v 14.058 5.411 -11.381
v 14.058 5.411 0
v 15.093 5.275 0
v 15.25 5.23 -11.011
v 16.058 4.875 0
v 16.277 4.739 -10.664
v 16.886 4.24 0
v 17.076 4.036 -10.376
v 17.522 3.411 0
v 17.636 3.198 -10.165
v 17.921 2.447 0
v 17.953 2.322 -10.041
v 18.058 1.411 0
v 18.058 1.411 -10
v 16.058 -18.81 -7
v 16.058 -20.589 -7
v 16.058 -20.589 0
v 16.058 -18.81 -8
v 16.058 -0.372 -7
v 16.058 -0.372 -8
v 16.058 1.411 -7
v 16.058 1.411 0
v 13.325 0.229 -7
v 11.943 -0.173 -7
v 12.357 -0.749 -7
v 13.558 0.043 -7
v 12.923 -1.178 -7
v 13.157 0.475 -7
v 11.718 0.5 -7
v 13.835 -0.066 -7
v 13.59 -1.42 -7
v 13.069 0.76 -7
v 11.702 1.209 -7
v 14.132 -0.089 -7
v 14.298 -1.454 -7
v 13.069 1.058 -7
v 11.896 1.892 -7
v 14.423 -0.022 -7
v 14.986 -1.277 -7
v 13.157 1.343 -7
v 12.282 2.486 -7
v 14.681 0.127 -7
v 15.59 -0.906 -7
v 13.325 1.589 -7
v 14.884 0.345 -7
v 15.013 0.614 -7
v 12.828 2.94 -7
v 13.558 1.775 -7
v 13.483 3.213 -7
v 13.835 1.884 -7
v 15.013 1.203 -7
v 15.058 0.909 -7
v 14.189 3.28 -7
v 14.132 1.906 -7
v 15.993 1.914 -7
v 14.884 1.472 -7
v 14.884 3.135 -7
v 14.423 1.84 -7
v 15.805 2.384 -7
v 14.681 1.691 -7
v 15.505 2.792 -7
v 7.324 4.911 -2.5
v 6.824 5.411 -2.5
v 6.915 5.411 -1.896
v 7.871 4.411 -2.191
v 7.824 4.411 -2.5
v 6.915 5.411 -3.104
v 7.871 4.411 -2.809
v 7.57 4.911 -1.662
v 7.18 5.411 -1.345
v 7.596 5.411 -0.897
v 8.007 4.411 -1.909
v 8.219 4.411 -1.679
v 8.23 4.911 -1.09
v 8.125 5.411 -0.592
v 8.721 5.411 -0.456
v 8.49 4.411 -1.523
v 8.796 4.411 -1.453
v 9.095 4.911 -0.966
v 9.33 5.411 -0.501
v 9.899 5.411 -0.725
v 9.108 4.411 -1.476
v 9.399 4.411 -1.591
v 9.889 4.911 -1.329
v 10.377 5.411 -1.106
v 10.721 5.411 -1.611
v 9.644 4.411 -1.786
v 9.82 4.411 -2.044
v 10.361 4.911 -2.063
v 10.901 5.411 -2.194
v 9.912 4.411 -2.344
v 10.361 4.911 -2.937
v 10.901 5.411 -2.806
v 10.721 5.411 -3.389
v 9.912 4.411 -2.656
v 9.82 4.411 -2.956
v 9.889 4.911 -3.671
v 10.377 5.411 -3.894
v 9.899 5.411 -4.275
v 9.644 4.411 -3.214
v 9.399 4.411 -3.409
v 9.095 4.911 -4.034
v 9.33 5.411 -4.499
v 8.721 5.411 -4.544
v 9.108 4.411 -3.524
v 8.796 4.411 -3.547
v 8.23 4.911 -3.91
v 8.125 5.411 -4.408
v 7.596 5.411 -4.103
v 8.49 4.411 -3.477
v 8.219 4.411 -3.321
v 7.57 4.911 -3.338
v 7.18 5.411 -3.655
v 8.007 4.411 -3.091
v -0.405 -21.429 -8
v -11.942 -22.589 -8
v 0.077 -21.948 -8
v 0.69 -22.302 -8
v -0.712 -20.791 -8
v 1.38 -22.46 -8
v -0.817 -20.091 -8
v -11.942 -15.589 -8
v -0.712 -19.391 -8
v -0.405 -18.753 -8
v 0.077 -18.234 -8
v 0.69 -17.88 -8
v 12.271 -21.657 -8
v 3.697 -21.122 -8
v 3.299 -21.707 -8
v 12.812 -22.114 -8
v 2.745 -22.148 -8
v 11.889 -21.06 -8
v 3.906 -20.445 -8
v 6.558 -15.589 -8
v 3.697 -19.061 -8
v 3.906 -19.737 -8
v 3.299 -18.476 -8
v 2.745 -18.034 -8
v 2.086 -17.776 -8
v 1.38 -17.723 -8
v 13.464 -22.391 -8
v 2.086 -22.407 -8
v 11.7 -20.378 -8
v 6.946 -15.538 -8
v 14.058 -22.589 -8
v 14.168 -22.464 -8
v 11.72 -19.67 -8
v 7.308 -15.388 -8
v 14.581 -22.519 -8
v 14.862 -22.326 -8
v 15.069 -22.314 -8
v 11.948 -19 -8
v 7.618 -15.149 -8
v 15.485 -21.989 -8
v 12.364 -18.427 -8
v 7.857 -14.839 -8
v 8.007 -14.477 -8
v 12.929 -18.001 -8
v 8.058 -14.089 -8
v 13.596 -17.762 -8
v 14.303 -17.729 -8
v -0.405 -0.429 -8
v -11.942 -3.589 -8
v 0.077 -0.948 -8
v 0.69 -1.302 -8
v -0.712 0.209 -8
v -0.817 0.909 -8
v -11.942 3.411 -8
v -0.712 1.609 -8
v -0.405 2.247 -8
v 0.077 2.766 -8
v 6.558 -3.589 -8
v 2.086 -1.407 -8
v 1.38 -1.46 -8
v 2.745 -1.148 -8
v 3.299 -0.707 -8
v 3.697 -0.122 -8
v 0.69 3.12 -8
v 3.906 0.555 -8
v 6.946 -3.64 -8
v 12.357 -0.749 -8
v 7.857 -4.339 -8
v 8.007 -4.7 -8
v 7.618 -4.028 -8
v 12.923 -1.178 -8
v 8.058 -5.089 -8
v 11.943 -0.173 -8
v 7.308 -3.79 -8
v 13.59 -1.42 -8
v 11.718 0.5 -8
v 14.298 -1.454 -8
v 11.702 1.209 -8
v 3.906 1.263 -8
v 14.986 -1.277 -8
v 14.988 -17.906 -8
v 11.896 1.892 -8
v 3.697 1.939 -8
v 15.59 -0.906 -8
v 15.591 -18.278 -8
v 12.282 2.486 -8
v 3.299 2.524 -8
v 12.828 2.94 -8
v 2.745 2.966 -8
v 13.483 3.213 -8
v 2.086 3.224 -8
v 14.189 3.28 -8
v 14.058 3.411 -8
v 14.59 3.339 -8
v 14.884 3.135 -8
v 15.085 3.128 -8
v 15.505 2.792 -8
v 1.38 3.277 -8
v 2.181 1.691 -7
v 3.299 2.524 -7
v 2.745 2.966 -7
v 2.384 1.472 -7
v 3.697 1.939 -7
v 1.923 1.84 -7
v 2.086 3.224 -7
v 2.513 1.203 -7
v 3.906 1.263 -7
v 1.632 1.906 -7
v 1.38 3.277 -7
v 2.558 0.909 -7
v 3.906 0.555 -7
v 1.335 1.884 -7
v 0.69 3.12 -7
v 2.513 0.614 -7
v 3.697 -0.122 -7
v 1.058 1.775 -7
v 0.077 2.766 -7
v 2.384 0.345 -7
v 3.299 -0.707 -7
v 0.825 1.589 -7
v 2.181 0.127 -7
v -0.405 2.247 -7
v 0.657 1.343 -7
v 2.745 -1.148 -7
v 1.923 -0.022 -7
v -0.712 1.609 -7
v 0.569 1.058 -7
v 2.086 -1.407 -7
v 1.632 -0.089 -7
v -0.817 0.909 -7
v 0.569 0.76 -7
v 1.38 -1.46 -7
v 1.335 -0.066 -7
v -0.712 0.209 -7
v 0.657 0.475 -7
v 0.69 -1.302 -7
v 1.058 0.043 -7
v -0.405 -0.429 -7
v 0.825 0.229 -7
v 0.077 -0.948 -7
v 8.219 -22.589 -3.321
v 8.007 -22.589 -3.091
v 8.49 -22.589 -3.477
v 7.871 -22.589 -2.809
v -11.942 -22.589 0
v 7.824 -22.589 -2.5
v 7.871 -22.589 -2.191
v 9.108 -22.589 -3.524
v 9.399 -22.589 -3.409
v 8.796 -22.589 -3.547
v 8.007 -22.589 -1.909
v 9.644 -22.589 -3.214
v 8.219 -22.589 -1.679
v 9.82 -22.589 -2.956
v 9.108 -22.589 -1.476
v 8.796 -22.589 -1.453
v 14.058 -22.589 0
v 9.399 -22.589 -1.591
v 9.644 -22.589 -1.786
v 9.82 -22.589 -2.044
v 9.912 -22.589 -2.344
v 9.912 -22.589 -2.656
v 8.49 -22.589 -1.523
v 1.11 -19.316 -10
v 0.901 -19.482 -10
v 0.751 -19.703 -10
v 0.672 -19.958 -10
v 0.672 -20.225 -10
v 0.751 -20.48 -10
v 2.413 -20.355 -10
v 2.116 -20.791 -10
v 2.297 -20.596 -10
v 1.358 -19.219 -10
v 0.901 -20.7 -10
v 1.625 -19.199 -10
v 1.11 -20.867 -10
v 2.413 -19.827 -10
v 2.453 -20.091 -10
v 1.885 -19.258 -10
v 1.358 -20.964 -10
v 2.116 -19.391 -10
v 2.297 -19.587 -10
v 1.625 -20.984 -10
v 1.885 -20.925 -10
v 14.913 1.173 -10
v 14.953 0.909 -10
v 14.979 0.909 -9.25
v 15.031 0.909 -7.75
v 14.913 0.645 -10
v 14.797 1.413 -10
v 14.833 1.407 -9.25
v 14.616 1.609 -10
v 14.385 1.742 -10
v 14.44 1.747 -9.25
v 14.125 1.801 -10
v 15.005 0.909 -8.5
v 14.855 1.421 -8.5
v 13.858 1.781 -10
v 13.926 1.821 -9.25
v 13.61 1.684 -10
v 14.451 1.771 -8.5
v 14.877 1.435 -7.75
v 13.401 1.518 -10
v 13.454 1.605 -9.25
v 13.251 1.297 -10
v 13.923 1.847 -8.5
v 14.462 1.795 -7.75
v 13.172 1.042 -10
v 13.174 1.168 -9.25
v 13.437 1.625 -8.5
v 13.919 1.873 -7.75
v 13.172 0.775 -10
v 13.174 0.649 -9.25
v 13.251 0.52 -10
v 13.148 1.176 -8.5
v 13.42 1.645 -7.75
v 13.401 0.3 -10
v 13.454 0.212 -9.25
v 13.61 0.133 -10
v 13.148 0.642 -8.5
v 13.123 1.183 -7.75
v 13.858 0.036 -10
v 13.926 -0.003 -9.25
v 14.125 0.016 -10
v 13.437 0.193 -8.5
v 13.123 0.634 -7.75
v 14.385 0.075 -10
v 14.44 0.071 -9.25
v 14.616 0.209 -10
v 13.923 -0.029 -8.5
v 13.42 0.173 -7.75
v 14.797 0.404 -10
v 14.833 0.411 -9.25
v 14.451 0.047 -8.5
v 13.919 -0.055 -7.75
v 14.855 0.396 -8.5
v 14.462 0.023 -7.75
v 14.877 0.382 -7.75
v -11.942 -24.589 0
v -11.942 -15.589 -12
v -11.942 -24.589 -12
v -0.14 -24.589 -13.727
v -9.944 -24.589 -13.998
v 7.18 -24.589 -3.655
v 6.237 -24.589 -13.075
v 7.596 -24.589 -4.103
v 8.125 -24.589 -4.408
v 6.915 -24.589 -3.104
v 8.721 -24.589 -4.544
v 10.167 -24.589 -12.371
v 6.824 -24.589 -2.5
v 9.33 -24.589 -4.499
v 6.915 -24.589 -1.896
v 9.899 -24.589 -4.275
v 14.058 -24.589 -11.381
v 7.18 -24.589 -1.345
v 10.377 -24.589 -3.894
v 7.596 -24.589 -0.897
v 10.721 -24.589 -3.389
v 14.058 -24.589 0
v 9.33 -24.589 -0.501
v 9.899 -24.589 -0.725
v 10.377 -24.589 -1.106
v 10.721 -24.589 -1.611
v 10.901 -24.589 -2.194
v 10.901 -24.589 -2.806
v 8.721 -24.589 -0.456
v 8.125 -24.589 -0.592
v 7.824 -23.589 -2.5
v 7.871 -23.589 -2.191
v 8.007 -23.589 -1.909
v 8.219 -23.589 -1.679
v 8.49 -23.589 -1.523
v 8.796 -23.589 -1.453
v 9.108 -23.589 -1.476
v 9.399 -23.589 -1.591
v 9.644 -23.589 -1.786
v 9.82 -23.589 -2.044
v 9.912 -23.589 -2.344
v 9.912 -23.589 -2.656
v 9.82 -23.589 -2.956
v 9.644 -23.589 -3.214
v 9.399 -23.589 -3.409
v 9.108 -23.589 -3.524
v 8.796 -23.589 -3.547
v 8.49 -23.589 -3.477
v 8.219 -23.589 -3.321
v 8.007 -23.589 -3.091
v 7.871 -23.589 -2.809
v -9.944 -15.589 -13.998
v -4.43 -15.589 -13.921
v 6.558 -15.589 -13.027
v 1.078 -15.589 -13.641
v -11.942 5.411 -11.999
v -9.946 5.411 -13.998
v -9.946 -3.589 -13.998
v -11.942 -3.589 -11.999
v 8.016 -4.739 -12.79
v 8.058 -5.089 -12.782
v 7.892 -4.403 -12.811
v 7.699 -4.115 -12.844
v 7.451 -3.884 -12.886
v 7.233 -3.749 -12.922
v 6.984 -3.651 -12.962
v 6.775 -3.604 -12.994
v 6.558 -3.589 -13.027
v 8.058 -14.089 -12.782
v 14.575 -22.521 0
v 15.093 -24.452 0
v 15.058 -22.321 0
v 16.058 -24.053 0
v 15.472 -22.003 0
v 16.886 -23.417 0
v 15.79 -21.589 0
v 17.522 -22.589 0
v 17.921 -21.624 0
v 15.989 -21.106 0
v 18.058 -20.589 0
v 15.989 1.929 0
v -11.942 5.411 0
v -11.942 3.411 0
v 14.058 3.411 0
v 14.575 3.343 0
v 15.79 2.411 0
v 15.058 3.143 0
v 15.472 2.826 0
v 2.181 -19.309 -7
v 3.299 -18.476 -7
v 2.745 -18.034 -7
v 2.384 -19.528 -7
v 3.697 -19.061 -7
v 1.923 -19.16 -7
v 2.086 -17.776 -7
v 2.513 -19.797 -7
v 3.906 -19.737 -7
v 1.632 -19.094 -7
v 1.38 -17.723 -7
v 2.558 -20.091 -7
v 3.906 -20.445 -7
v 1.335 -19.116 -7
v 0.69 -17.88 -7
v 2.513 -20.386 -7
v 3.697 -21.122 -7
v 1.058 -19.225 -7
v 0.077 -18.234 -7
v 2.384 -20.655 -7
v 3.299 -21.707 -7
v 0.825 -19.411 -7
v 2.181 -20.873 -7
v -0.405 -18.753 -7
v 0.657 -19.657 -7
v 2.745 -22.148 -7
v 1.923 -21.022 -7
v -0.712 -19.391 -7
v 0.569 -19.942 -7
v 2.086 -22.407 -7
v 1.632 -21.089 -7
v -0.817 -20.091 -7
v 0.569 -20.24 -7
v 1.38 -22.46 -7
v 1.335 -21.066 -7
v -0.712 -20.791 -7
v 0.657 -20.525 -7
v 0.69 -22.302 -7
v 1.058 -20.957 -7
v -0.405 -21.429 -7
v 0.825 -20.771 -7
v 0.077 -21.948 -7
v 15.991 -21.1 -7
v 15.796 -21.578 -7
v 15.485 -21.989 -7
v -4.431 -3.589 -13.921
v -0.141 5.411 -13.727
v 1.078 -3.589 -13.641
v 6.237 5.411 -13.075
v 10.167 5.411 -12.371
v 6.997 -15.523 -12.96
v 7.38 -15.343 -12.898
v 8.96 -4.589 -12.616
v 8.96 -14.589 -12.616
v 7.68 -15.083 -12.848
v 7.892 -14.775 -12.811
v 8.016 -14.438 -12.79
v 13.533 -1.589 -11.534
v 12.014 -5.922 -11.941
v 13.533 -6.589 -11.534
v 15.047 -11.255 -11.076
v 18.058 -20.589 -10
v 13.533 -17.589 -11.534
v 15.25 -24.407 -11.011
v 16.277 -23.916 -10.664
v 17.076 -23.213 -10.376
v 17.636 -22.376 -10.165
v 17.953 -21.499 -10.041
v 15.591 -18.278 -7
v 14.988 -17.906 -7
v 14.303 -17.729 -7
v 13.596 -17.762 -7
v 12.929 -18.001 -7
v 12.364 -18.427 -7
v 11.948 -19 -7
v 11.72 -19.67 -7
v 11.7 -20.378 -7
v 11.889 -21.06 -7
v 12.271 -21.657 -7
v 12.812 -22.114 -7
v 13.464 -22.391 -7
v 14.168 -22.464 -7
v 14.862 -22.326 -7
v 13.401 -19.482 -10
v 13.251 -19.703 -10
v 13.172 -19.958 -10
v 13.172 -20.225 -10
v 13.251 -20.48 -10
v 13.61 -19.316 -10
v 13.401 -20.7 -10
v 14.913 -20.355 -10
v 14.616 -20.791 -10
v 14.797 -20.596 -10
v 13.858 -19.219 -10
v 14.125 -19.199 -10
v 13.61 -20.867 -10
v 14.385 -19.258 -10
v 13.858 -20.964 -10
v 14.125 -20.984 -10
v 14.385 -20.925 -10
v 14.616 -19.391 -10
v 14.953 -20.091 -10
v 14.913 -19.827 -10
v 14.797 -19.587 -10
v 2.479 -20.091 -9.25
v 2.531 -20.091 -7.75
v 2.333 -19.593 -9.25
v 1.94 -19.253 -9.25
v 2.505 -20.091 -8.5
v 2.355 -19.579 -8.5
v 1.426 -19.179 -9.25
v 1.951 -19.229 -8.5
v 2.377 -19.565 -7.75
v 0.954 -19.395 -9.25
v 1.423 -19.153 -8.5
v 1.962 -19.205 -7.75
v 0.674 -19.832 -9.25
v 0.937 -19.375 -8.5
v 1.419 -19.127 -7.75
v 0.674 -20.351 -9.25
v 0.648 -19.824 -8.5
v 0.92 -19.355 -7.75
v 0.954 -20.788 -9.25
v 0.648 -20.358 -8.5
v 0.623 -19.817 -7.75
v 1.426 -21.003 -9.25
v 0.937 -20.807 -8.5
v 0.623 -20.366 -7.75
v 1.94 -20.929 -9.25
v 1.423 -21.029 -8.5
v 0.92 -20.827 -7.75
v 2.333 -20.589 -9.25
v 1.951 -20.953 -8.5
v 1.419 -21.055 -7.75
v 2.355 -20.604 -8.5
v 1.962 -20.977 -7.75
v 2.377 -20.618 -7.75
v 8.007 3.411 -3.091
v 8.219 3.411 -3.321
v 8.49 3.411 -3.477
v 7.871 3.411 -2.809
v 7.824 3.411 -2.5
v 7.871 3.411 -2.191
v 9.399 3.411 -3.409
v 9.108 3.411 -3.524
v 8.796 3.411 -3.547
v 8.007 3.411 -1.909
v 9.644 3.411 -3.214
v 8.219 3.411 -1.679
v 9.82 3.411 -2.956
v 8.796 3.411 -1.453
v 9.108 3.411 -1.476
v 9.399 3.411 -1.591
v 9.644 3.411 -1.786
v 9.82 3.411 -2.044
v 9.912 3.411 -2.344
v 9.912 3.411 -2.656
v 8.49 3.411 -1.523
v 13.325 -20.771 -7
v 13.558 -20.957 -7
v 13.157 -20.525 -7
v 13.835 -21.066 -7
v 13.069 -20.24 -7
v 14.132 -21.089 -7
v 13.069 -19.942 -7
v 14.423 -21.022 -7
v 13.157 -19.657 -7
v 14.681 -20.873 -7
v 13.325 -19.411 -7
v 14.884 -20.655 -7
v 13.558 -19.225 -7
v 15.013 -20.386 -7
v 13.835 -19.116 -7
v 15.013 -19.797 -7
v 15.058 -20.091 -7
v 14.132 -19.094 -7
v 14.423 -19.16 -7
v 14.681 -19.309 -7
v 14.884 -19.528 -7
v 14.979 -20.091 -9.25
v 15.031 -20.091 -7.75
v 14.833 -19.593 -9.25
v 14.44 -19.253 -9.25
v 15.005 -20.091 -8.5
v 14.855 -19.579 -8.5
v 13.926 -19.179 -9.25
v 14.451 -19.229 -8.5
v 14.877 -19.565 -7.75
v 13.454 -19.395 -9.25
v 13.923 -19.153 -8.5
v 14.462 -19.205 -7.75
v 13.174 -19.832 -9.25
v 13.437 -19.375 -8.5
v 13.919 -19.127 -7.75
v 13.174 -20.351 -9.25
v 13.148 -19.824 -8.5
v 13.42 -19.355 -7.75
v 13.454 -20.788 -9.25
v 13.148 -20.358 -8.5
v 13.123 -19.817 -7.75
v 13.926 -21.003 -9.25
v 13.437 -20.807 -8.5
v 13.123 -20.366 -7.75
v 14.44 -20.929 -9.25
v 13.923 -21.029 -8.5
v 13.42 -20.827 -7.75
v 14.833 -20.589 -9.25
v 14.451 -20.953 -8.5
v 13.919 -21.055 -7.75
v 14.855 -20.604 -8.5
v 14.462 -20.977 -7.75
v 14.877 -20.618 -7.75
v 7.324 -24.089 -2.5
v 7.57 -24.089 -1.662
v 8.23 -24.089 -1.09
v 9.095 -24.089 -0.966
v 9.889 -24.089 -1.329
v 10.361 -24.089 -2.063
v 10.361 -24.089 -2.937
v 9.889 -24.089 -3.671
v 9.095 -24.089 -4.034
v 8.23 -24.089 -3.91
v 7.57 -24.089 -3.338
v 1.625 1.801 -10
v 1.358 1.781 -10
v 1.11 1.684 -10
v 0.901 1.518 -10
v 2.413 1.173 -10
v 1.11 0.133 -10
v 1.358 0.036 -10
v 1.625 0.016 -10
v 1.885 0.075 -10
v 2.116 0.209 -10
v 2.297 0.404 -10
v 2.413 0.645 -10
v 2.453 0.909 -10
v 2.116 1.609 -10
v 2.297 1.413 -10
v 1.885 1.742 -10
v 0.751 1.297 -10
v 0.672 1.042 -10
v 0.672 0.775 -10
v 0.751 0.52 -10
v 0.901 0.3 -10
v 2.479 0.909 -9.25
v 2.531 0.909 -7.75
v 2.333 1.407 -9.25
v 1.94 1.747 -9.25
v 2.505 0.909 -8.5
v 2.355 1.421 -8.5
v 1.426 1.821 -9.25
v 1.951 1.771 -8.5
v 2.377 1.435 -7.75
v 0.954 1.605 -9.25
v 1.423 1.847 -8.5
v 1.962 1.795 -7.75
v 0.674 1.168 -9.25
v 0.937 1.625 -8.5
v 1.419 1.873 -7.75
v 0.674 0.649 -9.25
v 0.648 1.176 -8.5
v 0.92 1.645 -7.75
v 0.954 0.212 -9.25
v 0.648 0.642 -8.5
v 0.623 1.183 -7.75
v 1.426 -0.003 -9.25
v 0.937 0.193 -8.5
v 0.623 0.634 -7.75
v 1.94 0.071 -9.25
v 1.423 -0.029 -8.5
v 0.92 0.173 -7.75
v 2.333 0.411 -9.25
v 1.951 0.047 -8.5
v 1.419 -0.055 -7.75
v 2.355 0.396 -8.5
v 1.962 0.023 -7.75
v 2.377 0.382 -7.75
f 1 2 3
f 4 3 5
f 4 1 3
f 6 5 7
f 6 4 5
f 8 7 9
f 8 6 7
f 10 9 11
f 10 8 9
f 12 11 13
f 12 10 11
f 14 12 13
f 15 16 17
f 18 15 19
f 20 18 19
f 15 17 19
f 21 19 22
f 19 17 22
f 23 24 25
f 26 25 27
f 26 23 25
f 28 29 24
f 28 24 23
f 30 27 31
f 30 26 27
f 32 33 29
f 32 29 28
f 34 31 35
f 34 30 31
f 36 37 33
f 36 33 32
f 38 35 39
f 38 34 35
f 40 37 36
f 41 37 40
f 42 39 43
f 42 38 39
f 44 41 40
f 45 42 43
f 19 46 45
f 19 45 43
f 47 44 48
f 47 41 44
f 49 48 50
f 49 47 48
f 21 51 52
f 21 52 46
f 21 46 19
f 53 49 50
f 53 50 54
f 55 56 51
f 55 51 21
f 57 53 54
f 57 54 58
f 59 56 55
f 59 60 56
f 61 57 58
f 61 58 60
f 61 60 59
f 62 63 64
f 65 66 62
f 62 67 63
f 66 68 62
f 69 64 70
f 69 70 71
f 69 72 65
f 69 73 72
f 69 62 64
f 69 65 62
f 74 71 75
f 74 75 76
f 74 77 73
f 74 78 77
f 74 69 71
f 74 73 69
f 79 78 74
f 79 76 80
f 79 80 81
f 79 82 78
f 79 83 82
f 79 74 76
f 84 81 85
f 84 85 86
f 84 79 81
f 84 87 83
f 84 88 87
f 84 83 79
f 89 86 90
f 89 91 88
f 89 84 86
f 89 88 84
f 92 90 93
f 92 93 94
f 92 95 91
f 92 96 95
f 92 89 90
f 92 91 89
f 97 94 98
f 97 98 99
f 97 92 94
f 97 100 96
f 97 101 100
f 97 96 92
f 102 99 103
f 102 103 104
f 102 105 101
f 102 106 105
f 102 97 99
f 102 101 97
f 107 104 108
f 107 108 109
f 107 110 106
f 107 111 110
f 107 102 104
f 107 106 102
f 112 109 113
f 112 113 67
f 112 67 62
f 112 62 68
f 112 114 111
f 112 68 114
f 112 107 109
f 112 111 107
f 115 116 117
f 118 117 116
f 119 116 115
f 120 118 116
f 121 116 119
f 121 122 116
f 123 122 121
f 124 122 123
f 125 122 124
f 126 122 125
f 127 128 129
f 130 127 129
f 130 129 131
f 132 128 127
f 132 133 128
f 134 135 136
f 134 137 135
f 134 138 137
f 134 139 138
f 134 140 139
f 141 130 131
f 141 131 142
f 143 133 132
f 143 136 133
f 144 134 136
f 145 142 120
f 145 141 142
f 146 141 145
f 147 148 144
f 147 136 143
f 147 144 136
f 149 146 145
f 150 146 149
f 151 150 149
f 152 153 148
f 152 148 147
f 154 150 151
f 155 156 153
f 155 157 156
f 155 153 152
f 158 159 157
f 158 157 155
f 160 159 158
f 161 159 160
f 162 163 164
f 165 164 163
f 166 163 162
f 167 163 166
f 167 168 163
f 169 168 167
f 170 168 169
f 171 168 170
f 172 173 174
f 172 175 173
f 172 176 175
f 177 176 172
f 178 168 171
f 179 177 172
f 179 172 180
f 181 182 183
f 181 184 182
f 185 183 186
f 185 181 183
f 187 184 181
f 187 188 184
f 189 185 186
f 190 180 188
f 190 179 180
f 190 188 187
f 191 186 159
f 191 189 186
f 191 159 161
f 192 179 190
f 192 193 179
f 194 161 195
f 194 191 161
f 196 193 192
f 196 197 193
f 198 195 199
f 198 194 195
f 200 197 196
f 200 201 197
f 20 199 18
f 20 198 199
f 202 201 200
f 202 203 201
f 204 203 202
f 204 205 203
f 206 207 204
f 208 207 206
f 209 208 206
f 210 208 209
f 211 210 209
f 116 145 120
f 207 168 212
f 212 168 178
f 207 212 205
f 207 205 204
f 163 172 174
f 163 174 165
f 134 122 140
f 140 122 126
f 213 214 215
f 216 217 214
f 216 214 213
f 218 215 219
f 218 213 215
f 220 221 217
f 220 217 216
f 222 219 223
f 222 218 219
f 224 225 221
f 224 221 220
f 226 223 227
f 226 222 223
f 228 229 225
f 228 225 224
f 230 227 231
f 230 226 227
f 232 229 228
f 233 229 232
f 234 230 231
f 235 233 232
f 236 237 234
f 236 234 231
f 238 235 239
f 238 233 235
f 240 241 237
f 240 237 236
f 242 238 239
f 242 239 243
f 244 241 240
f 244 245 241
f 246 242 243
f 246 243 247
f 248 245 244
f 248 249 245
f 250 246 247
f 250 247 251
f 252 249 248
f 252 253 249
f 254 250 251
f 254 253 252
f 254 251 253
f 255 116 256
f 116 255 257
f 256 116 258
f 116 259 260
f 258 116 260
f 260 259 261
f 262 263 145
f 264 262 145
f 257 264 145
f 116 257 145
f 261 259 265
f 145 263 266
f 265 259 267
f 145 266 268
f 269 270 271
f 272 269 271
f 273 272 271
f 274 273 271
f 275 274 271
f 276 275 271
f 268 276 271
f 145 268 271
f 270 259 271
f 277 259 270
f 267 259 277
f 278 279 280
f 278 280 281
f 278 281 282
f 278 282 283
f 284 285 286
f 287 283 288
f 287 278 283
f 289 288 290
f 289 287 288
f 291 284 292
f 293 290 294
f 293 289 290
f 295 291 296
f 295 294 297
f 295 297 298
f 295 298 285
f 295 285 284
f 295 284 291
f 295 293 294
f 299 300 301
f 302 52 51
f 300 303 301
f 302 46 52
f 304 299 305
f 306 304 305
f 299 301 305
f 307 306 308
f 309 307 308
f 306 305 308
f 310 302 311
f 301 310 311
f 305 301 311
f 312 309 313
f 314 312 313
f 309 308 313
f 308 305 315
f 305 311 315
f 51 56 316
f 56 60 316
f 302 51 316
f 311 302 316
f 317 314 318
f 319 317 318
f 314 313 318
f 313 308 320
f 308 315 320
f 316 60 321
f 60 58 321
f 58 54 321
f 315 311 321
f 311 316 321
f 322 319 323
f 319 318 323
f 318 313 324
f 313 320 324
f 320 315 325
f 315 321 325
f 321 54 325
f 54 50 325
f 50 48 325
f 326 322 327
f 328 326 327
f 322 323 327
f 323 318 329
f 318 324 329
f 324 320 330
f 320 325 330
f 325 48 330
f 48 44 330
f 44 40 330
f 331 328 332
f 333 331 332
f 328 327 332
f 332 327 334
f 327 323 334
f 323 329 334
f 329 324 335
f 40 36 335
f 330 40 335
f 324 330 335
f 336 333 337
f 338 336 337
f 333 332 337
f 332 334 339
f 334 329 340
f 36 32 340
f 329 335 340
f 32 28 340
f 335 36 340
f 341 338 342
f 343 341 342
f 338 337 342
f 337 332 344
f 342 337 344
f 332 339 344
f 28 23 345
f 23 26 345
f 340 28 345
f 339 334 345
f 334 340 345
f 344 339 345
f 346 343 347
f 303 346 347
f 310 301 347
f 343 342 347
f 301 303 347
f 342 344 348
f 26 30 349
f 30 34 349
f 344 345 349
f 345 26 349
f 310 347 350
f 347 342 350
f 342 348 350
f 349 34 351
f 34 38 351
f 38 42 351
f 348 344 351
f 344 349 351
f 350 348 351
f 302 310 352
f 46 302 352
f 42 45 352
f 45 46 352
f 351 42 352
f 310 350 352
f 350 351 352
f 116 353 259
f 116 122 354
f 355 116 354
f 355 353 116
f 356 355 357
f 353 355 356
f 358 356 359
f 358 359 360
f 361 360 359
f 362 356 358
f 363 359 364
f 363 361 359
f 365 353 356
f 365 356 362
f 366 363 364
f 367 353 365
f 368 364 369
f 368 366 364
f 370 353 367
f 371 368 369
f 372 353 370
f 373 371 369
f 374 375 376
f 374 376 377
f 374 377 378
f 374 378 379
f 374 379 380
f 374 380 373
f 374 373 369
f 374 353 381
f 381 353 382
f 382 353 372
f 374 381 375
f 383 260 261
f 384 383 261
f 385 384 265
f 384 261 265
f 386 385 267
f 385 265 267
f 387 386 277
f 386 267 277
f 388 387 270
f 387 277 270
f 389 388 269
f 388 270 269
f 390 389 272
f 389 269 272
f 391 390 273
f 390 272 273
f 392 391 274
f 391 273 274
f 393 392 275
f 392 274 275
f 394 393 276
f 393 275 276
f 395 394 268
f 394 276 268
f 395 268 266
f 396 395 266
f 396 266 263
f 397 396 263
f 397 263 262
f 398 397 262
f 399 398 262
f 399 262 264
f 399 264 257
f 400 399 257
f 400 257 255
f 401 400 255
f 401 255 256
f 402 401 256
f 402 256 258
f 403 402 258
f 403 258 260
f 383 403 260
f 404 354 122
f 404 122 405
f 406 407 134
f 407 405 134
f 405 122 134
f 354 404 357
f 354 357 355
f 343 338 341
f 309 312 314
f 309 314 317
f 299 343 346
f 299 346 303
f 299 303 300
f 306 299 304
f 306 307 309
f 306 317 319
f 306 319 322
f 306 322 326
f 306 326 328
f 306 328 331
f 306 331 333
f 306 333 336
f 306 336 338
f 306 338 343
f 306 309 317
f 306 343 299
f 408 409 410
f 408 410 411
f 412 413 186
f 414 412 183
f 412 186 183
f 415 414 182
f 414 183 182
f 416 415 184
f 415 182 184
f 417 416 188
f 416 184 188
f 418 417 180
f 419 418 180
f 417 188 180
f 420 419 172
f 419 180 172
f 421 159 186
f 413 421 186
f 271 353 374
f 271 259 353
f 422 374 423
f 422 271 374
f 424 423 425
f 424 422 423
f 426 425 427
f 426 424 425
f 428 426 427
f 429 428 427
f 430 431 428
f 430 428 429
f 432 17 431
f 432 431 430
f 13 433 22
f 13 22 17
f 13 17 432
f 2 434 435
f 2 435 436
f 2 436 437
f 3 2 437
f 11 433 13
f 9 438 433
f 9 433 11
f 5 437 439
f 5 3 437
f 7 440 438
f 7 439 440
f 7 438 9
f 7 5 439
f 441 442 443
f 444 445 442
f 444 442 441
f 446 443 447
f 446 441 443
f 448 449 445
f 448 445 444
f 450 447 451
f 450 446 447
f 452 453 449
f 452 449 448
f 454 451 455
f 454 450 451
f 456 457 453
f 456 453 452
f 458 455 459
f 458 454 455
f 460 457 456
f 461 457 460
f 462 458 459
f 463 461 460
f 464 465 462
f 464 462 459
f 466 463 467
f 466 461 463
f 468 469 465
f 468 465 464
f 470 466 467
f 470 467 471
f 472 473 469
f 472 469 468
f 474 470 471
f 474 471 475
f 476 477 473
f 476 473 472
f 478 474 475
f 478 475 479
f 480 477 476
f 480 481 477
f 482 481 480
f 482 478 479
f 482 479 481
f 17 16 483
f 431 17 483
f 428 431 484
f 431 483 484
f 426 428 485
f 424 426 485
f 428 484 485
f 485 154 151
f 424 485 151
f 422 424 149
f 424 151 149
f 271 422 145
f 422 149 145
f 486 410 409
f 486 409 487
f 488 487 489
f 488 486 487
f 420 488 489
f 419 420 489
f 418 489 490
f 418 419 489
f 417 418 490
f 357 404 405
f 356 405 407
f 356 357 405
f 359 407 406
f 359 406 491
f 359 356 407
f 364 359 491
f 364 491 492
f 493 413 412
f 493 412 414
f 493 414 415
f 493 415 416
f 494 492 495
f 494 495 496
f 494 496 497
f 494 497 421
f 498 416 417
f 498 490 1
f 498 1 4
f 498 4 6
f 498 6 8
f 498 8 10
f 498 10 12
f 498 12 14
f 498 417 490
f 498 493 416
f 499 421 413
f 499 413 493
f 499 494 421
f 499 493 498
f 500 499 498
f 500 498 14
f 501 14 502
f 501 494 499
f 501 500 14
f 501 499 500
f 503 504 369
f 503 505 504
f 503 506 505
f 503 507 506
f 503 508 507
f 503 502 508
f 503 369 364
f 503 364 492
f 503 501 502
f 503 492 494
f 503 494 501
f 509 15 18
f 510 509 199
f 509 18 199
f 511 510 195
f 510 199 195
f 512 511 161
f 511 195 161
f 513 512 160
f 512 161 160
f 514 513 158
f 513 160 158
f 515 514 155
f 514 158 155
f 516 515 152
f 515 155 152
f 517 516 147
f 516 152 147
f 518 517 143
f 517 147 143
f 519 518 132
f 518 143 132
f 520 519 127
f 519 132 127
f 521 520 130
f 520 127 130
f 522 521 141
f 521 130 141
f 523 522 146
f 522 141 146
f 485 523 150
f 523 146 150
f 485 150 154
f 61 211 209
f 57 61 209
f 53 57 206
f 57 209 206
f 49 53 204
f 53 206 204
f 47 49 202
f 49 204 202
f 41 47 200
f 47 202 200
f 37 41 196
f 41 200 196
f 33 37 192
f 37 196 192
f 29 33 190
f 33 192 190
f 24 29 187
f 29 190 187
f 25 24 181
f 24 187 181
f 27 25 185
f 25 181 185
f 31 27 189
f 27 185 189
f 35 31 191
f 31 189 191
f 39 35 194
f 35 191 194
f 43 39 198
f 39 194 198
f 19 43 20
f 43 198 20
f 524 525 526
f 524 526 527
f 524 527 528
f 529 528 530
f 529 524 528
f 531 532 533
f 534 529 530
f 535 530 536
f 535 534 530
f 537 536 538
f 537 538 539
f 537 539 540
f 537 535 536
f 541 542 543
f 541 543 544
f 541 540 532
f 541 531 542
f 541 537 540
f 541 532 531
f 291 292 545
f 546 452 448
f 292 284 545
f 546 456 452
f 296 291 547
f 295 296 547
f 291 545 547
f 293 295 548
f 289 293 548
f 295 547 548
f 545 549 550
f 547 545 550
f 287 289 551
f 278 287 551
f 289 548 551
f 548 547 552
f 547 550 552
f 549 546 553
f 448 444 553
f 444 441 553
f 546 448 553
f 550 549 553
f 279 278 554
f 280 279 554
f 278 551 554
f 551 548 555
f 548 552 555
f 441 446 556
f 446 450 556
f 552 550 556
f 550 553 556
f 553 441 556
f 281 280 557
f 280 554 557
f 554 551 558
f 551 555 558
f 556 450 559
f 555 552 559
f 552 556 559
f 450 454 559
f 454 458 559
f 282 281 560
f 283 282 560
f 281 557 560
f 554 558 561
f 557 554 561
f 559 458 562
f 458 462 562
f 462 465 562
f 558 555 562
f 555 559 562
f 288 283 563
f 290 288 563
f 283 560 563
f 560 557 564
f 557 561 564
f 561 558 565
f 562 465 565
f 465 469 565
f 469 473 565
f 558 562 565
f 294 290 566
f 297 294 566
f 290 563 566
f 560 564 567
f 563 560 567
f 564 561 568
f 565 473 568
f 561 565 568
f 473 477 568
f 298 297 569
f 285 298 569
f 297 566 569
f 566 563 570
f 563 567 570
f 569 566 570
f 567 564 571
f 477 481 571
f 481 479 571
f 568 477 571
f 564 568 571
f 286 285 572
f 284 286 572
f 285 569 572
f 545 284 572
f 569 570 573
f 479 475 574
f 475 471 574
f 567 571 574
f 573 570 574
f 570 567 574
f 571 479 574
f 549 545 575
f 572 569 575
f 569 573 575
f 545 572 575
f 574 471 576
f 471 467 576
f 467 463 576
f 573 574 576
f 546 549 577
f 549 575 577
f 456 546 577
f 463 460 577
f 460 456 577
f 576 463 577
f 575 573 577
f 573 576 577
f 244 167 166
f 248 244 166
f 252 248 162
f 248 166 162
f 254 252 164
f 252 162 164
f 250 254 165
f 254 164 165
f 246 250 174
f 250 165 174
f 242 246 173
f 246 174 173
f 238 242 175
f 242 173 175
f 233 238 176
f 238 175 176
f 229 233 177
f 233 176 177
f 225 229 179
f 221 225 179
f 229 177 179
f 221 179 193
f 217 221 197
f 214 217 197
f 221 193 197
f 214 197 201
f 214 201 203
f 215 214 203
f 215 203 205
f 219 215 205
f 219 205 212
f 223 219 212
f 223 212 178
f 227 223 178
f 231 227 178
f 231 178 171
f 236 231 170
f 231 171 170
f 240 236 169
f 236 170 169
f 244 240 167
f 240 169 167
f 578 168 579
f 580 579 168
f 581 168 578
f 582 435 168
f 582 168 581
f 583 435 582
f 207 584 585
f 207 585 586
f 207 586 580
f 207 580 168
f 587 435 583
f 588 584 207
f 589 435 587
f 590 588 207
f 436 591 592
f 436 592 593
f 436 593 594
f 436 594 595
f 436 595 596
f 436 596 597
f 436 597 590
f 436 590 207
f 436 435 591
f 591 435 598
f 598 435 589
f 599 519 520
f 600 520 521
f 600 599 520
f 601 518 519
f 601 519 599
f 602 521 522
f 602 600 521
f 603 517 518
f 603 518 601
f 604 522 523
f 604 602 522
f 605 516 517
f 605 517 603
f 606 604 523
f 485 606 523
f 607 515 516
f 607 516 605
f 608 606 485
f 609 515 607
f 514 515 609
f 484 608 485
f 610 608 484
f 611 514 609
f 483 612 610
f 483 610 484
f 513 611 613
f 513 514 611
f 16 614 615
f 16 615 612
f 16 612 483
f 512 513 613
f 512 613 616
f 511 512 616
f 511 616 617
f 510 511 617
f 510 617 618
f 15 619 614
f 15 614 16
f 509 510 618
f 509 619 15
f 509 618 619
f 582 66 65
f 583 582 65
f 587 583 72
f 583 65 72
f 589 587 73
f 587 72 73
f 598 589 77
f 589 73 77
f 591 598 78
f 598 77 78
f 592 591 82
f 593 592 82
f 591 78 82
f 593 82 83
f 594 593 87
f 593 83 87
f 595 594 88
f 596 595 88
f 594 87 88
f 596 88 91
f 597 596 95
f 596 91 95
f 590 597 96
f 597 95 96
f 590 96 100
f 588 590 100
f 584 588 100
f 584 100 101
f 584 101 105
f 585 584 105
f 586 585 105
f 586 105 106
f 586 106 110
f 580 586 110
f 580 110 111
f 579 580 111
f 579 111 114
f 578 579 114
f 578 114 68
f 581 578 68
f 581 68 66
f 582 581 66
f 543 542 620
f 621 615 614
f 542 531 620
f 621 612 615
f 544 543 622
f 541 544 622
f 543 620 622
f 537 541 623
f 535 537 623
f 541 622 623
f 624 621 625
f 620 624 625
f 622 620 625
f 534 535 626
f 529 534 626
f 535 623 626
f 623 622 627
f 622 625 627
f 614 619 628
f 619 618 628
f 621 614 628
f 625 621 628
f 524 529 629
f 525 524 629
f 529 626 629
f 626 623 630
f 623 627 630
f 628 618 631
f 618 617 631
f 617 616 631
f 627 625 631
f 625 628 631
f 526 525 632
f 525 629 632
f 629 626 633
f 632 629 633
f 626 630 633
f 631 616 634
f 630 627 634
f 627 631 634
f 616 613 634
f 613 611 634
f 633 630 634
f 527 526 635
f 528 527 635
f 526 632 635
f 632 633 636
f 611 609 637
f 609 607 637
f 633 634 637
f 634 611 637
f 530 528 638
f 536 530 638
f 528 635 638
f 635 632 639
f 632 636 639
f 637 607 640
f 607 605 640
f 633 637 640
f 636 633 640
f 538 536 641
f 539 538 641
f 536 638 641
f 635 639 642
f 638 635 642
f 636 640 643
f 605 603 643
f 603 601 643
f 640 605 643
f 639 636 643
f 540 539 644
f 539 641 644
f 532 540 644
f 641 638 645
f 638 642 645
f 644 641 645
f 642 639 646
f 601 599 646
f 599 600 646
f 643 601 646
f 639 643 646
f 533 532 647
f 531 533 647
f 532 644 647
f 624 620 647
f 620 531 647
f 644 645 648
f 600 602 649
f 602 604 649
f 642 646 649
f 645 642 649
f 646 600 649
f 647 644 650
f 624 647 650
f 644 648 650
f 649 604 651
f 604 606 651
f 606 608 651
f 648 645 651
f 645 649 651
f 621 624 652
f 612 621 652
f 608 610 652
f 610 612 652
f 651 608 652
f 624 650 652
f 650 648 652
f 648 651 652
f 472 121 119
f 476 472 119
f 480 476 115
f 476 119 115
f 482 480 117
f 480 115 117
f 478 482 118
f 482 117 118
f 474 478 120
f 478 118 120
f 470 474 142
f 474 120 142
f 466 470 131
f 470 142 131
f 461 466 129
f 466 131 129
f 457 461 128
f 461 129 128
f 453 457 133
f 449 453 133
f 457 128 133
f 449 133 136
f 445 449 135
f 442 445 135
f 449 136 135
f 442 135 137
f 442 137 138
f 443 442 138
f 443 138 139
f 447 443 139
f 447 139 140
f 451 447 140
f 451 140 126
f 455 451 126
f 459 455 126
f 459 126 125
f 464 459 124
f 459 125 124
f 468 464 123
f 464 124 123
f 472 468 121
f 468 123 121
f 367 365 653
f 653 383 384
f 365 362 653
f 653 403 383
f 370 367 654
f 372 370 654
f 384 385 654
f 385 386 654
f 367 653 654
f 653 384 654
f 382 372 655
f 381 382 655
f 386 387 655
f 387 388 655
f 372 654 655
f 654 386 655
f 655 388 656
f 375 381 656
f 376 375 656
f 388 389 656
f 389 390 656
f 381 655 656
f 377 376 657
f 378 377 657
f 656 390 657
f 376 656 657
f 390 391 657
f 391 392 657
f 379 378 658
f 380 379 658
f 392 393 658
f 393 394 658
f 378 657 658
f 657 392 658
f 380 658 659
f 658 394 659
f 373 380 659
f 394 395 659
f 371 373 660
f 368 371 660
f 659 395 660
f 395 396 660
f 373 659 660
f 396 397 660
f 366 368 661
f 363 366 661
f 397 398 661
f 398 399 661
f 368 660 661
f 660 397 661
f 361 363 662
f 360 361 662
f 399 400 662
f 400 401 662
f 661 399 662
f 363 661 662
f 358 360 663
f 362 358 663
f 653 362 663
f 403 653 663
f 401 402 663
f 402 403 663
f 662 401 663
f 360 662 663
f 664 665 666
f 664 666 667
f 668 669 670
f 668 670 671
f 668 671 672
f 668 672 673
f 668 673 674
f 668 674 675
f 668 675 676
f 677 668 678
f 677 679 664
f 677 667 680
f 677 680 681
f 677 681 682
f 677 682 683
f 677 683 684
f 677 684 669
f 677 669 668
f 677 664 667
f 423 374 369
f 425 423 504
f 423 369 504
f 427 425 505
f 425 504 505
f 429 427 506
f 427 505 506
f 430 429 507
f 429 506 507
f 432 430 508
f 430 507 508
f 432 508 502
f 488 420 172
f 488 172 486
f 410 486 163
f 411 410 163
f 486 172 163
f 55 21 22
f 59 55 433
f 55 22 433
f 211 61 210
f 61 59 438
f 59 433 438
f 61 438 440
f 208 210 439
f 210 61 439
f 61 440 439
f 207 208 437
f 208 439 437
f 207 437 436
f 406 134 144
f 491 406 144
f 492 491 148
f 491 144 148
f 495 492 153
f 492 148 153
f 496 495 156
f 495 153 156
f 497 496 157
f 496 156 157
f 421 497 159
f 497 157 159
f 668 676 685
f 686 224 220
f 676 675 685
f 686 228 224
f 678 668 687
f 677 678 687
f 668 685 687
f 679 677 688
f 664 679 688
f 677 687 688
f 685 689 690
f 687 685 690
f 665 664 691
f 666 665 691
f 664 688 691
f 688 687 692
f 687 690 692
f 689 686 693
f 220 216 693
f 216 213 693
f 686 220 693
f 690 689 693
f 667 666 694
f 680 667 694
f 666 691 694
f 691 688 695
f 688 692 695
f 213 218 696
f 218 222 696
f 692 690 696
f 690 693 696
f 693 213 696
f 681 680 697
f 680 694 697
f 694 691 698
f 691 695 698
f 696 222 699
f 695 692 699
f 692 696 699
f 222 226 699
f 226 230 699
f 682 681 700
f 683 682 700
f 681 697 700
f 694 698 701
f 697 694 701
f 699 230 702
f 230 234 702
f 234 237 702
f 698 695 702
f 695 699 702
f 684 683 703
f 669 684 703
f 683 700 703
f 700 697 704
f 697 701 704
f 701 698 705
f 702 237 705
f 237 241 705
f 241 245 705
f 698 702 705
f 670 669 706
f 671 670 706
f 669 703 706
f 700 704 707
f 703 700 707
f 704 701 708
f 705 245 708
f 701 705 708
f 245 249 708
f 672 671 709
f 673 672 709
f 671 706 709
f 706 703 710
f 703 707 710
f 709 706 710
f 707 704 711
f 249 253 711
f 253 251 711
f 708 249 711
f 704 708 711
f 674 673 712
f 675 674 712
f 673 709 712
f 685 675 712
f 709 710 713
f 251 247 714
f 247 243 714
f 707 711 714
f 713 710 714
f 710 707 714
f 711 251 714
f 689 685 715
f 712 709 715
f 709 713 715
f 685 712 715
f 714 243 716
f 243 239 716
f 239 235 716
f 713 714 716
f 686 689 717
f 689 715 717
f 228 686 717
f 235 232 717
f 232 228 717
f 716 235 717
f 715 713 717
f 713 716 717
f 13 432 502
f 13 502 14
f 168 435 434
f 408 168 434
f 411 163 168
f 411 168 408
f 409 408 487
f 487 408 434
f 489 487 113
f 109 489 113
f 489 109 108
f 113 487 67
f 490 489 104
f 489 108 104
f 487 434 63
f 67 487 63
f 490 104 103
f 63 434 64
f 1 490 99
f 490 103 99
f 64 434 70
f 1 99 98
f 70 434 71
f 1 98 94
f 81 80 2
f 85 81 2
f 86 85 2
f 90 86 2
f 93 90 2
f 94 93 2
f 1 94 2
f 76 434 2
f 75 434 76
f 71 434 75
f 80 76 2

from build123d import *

# Parameters (mm, degrees)
SKETCH_2_W                    = 30
SKETCH_2_H                    = 30
EXTRUDE_1_DEPTH               = 10
SHELL_1_T                     = -2
CUT_EXTRUDE_1_REACH           = 34.104
SKETCH_3_W                    = 28
SKETCH_3_H                    = 26
EXTRUDE_2_DEPTH               = 30
CUT_EXTRUDE_2_DEPTH           = 34.566112599
SKETCH_6_R                    = 2.375
EXTRUDE_3_DEPTH               = 1
SKETCH_7_R                    = 1
CUT_EXTRUDE_3_DEPTH           = 3
CUT_EXTRUDE_3_DRAFT           = -2
CUT_EXTRUDE_3_PROFILE_2_DEPTH = 3
CUT_EXTRUDE_3_PROFILE_2_DRAFT = -2
CUT_EXTRUDE_3_PROFILE_3_DEPTH = 3
CUT_EXTRUDE_3_PROFILE_3_DRAFT = -2
CUT_EXTRUDE_3_PROFILE_4_DEPTH = 3
CUT_EXTRUDE_3_PROFILE_4_DRAFT = -2
FILLET_2_R                    = 2
FILLET_3_R                    = 4
SKETCH_8_R                    = 1.05
CUT_EXTRUDE_4_DEPTH           = 38.710498044
CHAMFER_1_SIZE                = 1
CHAMFER_2_SIZE                = 2.001261587
CHAMFER_2_SIZE_2              = 2


with BuildPart() as part:
    # 草图2 → 凸台-拉伸1 (new body)
    with BuildSketch(Plane.XY):
        with Locations((3.057614324, -9.588661073)):
            Rectangle(SKETCH_2_W, SKETCH_2_H)
    extrude(amount=-EXTRUDE_1_DEPTH)

    # 抽壳1
    shell_1_openings = [part.faces().sort_by_distance(p)[0] for p in [
        (-11.942385676, -9.588661073, -5),
    ]]
    offset(amount=SHELL_1_T, openings=shell_1_openings, kind=Kind.INTERSECTION)

    # 草图3 → 切除-拉伸1 (cut, up to next)
    with BuildSketch(Plane.XY, mode=Mode.PRIVATE) as cut_extrude_1_sk1:
        with Locations((2.057614324, -9.588661073)):
            Rectangle(SKETCH_3_W, SKETCH_3_H)
    cut_extrude_1_tool1 = extrude(cut_extrude_1_sk1.sketch, amount=-CUT_EXTRUDE_1_REACH, mode=Mode.PRIVATE) & part.part
    add(cut_extrude_1_tool1.solids().sort_by_distance((2.057614, -9.588661, 0))[0], mode=Mode.SUBTRACT)

    # 草图4 → 凸台-拉伸2 (add)
    with BuildSketch(Plane.XZ.offset(24.588661073)):
        with BuildLine():
            Line((-11.942385676, -10), (-11.942385676, -14))
            add(Edge.make_bspline(
                [(-11.942385676, -14), (-1.471769767, -14.006598556), (8.440678476, -13.813297469), (18.057614324, -10)],
                knots=[0, 0, 0, 0, 1, 1, 1, 1], degree=3))
            Line((18.057614324, -10), (-11.942385676, -10))
        make_face()
    extrude(amount=-EXTRUDE_2_DEPTH)

    # 草图5 → 切除-拉伸2 (cut, through all)
    with BuildSketch(Plane.XY):
        with BuildLine():
            Line((6.557614324, -3.588661073), (-11.942385676, -3.588661073))
            Line((-11.942385676, -3.588661073), (-11.942385676, -15.588661073))
            Line((-11.942385676, -15.588661073), (6.557614324, -15.588661073))
            ThreePointArc((6.557614324, -15.588661073), (7.618274496, -15.149321245), (8.057614324, -14.088661073))
            Line((8.057614324, -14.088661073), (8.057614324, -5.088661073))
            ThreePointArc((8.057614324, -5.088661073), (7.618274496, -4.028000901), (6.557614324, -3.588661073))
        make_face()
    extrude(amount=-CUT_EXTRUDE_2_DEPTH, mode=Mode.SUBTRACT)

    # 草图6 → 凸台-拉伸3 (add)
    with BuildSketch(Plane.XY.offset(-8)):
        with Locations(Location((1.557614324, 0.908700453, 0), (0, 0, 180))):
            Circle(SKETCH_6_R)
        with Locations((14.057614324, 0.908700453)):
            Circle(SKETCH_6_R)
        with Locations(Location((1.557614324, -20.091299547, 0), (0, 0, 180))):
            Circle(SKETCH_6_R)
        with Locations((14.057614324, -20.091299547)):
            Circle(SKETCH_6_R)
    extrude(amount=EXTRUDE_3_DEPTH)


with BuildPart() as cut_extrude_3_tool:
    # 草图7 → 切除-拉伸3 (with draft: the straight prism first)
    with BuildSketch(Plane.XY.offset(-7)):
        with Locations((1.557614324, -20.091299547)):
            Circle(SKETCH_7_R)
    extrude(amount=-CUT_EXTRUDE_3_DEPTH)
    # 切除-拉伸3: the draft: its side faces are tilted about the plane it starts from
    cut_extrude_3_sides = [cut_extrude_3_tool.faces().sort_by_distance(p)[0] for p in [
        (0.557614324, -20.091299547, -8.5),
    ]]
    draft(cut_extrude_3_sides, Plane.XY.offset(-7), CUT_EXTRUDE_3_DRAFT)


with BuildPart() as part_1:
    add(part.part)

    # 切除-拉伸3: cut by cut_extrude_3_tool
    add(cut_extrude_3_tool.part, mode=Mode.SUBTRACT)


with BuildPart() as cut_extrude_3_profile_2_tool:
    # 草图7 → 切除-拉伸3 profile 2 (with draft: the straight prism first)
    with BuildSketch(Plane.XY.offset(-7)):
        with Locations((14.057614324, -20.091299547)):
            Circle(SKETCH_7_R)
    extrude(amount=-CUT_EXTRUDE_3_PROFILE_2_DEPTH)
    # 切除-拉伸3 profile 2: the draft: its side faces are tilted about the plane it starts from
    cut_extrude_3_profile_2_sides = [cut_extrude_3_profile_2_tool.faces().sort_by_distance(p)[0] for p in [
        (13.057614324, -20.091299547, -8.5),
    ]]
    draft(cut_extrude_3_profile_2_sides, Plane.XY.offset(-7), CUT_EXTRUDE_3_PROFILE_2_DRAFT)


with BuildPart() as part_2:
    add(part_1.part)

    # 切除-拉伸3 profile 2: cut by cut_extrude_3_profile_2_tool
    add(cut_extrude_3_profile_2_tool.part, mode=Mode.SUBTRACT)


with BuildPart() as cut_extrude_3_profile_3_tool:
    # 草图7 → 切除-拉伸3 profile 3 (with draft: the straight prism first)
    with BuildSketch(Plane.XY.offset(-7)):
        with Locations((1.557614324, 0.908700453)):
            Circle(SKETCH_7_R)
    extrude(amount=-CUT_EXTRUDE_3_PROFILE_3_DEPTH)
    # 切除-拉伸3 profile 3: the draft: its side faces are tilted about the plane it starts from
    cut_extrude_3_profile_3_sides = [cut_extrude_3_profile_3_tool.faces().sort_by_distance(p)[0] for p in [
        (0.557614324, 0.908700453, -8.5),
    ]]
    draft(cut_extrude_3_profile_3_sides, Plane.XY.offset(-7), CUT_EXTRUDE_3_PROFILE_3_DRAFT)


with BuildPart() as part_3:
    add(part_2.part)

    # 切除-拉伸3 profile 3: cut by cut_extrude_3_profile_3_tool
    add(cut_extrude_3_profile_3_tool.part, mode=Mode.SUBTRACT)


with BuildPart() as cut_extrude_3_profile_4_tool:
    # 草图7 → 切除-拉伸3 profile 4 (with draft: the straight prism first)
    with BuildSketch(Plane.XY.offset(-7)):
        with Locations((14.057614324, 0.908700453)):
            Circle(SKETCH_7_R)
    extrude(amount=-CUT_EXTRUDE_3_PROFILE_4_DEPTH)
    # 切除-拉伸3 profile 4: the draft: its side faces are tilted about the plane it starts from
    cut_extrude_3_profile_4_sides = [cut_extrude_3_profile_4_tool.faces().sort_by_distance(p)[0] for p in [
        (13.057614324, 0.908700453, -8.5),
    ]]
    draft(cut_extrude_3_profile_4_sides, Plane.XY.offset(-7), CUT_EXTRUDE_3_PROFILE_4_DRAFT)


with BuildPart() as part_4:
    add(part_3.part)

    # 切除-拉伸3 profile 4: cut by cut_extrude_3_profile_4_tool
    add(cut_extrude_3_profile_4_tool.part, mode=Mode.SUBTRACT)

    # 圆角2
    fillet_2_edges = [part_4.edges().sort_by_distance(p)[0] for p in [
        (16.057614324, 3.411338927, -4),
        (16.057614324, -22.588661073, -4),
    ]]
    fillet(fillet_2_edges, radius=FILLET_2_R)

    # 圆角3
    fillet_3_edges = [part_4.edges().sort_by_distance(p)[0] for p in [
        (18.057614324, -24.588661073, -5),
        (18.057614324, 5.411338927, -5),
    ]]
    fillet(fillet_3_edges, radius=FILLET_3_R)

    # 草图8 → 切除-拉伸4 (cut, through all)
    with BuildSketch(Plane(origin=(0, 5.411338927, 0), x_dir=(1, 0, 0), z_dir=(0, 1, 0))):
        with Locations(Location((8.874069652, 2.5, 0), (0, 0, 180))):
            Circle(SKETCH_8_R)
    extrude(amount=-CUT_EXTRUDE_4_DEPTH, mode=Mode.SUBTRACT)

    # 倒角1
    chamfer_1_edges = [part_4.edges().sort_by_distance(p)[0] for p in [
        (9.924069652, -24.588661073, -2.5),
        (9.924069652, 5.411338927, -2.5),
    ]]
    chamfer(chamfer_1_edges, length=CHAMFER_1_SIZE)

    # 倒角2
    # the kernel refuses this chamfer: 2.001261587, 2 mm, written as the material it takes off along each edge
    with BuildSketch(Plane(origin=(-11.942385676, -8.735358117, -14), x_dir=(0.9999994656090836, 0, 0.0010338189141659818), z_dir=(0, 1, 0))) as chamfer_2_piece_1:
        with BuildLine():
            Line((1.996680257, 0), (CHAMFER_2_SIZE * 0.00103381891429, -CHAMFER_2_SIZE * 0.99999946573))
            Line((CHAMFER_2_SIZE * 0.00103381891429, -CHAMFER_2_SIZE * 0.99999946573), (0, 0))
            ThreePointArc((0, 0), (1.026596764, 0.000946618), (1.996680257, 0))
        make_face()
    extrude(amount=19.293394088, mode=Mode.SUBTRACT)
    with BuildSketch(Plane(origin=(-11.942385676, -29.732118676, -14), x_dir=(0.99999946423231, 0, 0.001035149792544402), z_dir=(0, 1, 0))) as chamfer_2_piece_2:
        with BuildLine():
            Line((1.997932911, 0), (CHAMFER_2_SIZE_2 * 0.00103514979254, -CHAMFER_2_SIZE_2 * 0.999999464232))
            Line((CHAMFER_2_SIZE_2 * 0.00103514979254, -CHAMFER_2_SIZE_2 * 0.999999464232), (0, 0))
            ThreePointArc((0, 0), (1.027240915, 0.000948024), (1.997932911, 0))
        make_face()
    extrude(amount=19.286915207, mode=Mode.SUBTRACT)


solid = part_4.part
